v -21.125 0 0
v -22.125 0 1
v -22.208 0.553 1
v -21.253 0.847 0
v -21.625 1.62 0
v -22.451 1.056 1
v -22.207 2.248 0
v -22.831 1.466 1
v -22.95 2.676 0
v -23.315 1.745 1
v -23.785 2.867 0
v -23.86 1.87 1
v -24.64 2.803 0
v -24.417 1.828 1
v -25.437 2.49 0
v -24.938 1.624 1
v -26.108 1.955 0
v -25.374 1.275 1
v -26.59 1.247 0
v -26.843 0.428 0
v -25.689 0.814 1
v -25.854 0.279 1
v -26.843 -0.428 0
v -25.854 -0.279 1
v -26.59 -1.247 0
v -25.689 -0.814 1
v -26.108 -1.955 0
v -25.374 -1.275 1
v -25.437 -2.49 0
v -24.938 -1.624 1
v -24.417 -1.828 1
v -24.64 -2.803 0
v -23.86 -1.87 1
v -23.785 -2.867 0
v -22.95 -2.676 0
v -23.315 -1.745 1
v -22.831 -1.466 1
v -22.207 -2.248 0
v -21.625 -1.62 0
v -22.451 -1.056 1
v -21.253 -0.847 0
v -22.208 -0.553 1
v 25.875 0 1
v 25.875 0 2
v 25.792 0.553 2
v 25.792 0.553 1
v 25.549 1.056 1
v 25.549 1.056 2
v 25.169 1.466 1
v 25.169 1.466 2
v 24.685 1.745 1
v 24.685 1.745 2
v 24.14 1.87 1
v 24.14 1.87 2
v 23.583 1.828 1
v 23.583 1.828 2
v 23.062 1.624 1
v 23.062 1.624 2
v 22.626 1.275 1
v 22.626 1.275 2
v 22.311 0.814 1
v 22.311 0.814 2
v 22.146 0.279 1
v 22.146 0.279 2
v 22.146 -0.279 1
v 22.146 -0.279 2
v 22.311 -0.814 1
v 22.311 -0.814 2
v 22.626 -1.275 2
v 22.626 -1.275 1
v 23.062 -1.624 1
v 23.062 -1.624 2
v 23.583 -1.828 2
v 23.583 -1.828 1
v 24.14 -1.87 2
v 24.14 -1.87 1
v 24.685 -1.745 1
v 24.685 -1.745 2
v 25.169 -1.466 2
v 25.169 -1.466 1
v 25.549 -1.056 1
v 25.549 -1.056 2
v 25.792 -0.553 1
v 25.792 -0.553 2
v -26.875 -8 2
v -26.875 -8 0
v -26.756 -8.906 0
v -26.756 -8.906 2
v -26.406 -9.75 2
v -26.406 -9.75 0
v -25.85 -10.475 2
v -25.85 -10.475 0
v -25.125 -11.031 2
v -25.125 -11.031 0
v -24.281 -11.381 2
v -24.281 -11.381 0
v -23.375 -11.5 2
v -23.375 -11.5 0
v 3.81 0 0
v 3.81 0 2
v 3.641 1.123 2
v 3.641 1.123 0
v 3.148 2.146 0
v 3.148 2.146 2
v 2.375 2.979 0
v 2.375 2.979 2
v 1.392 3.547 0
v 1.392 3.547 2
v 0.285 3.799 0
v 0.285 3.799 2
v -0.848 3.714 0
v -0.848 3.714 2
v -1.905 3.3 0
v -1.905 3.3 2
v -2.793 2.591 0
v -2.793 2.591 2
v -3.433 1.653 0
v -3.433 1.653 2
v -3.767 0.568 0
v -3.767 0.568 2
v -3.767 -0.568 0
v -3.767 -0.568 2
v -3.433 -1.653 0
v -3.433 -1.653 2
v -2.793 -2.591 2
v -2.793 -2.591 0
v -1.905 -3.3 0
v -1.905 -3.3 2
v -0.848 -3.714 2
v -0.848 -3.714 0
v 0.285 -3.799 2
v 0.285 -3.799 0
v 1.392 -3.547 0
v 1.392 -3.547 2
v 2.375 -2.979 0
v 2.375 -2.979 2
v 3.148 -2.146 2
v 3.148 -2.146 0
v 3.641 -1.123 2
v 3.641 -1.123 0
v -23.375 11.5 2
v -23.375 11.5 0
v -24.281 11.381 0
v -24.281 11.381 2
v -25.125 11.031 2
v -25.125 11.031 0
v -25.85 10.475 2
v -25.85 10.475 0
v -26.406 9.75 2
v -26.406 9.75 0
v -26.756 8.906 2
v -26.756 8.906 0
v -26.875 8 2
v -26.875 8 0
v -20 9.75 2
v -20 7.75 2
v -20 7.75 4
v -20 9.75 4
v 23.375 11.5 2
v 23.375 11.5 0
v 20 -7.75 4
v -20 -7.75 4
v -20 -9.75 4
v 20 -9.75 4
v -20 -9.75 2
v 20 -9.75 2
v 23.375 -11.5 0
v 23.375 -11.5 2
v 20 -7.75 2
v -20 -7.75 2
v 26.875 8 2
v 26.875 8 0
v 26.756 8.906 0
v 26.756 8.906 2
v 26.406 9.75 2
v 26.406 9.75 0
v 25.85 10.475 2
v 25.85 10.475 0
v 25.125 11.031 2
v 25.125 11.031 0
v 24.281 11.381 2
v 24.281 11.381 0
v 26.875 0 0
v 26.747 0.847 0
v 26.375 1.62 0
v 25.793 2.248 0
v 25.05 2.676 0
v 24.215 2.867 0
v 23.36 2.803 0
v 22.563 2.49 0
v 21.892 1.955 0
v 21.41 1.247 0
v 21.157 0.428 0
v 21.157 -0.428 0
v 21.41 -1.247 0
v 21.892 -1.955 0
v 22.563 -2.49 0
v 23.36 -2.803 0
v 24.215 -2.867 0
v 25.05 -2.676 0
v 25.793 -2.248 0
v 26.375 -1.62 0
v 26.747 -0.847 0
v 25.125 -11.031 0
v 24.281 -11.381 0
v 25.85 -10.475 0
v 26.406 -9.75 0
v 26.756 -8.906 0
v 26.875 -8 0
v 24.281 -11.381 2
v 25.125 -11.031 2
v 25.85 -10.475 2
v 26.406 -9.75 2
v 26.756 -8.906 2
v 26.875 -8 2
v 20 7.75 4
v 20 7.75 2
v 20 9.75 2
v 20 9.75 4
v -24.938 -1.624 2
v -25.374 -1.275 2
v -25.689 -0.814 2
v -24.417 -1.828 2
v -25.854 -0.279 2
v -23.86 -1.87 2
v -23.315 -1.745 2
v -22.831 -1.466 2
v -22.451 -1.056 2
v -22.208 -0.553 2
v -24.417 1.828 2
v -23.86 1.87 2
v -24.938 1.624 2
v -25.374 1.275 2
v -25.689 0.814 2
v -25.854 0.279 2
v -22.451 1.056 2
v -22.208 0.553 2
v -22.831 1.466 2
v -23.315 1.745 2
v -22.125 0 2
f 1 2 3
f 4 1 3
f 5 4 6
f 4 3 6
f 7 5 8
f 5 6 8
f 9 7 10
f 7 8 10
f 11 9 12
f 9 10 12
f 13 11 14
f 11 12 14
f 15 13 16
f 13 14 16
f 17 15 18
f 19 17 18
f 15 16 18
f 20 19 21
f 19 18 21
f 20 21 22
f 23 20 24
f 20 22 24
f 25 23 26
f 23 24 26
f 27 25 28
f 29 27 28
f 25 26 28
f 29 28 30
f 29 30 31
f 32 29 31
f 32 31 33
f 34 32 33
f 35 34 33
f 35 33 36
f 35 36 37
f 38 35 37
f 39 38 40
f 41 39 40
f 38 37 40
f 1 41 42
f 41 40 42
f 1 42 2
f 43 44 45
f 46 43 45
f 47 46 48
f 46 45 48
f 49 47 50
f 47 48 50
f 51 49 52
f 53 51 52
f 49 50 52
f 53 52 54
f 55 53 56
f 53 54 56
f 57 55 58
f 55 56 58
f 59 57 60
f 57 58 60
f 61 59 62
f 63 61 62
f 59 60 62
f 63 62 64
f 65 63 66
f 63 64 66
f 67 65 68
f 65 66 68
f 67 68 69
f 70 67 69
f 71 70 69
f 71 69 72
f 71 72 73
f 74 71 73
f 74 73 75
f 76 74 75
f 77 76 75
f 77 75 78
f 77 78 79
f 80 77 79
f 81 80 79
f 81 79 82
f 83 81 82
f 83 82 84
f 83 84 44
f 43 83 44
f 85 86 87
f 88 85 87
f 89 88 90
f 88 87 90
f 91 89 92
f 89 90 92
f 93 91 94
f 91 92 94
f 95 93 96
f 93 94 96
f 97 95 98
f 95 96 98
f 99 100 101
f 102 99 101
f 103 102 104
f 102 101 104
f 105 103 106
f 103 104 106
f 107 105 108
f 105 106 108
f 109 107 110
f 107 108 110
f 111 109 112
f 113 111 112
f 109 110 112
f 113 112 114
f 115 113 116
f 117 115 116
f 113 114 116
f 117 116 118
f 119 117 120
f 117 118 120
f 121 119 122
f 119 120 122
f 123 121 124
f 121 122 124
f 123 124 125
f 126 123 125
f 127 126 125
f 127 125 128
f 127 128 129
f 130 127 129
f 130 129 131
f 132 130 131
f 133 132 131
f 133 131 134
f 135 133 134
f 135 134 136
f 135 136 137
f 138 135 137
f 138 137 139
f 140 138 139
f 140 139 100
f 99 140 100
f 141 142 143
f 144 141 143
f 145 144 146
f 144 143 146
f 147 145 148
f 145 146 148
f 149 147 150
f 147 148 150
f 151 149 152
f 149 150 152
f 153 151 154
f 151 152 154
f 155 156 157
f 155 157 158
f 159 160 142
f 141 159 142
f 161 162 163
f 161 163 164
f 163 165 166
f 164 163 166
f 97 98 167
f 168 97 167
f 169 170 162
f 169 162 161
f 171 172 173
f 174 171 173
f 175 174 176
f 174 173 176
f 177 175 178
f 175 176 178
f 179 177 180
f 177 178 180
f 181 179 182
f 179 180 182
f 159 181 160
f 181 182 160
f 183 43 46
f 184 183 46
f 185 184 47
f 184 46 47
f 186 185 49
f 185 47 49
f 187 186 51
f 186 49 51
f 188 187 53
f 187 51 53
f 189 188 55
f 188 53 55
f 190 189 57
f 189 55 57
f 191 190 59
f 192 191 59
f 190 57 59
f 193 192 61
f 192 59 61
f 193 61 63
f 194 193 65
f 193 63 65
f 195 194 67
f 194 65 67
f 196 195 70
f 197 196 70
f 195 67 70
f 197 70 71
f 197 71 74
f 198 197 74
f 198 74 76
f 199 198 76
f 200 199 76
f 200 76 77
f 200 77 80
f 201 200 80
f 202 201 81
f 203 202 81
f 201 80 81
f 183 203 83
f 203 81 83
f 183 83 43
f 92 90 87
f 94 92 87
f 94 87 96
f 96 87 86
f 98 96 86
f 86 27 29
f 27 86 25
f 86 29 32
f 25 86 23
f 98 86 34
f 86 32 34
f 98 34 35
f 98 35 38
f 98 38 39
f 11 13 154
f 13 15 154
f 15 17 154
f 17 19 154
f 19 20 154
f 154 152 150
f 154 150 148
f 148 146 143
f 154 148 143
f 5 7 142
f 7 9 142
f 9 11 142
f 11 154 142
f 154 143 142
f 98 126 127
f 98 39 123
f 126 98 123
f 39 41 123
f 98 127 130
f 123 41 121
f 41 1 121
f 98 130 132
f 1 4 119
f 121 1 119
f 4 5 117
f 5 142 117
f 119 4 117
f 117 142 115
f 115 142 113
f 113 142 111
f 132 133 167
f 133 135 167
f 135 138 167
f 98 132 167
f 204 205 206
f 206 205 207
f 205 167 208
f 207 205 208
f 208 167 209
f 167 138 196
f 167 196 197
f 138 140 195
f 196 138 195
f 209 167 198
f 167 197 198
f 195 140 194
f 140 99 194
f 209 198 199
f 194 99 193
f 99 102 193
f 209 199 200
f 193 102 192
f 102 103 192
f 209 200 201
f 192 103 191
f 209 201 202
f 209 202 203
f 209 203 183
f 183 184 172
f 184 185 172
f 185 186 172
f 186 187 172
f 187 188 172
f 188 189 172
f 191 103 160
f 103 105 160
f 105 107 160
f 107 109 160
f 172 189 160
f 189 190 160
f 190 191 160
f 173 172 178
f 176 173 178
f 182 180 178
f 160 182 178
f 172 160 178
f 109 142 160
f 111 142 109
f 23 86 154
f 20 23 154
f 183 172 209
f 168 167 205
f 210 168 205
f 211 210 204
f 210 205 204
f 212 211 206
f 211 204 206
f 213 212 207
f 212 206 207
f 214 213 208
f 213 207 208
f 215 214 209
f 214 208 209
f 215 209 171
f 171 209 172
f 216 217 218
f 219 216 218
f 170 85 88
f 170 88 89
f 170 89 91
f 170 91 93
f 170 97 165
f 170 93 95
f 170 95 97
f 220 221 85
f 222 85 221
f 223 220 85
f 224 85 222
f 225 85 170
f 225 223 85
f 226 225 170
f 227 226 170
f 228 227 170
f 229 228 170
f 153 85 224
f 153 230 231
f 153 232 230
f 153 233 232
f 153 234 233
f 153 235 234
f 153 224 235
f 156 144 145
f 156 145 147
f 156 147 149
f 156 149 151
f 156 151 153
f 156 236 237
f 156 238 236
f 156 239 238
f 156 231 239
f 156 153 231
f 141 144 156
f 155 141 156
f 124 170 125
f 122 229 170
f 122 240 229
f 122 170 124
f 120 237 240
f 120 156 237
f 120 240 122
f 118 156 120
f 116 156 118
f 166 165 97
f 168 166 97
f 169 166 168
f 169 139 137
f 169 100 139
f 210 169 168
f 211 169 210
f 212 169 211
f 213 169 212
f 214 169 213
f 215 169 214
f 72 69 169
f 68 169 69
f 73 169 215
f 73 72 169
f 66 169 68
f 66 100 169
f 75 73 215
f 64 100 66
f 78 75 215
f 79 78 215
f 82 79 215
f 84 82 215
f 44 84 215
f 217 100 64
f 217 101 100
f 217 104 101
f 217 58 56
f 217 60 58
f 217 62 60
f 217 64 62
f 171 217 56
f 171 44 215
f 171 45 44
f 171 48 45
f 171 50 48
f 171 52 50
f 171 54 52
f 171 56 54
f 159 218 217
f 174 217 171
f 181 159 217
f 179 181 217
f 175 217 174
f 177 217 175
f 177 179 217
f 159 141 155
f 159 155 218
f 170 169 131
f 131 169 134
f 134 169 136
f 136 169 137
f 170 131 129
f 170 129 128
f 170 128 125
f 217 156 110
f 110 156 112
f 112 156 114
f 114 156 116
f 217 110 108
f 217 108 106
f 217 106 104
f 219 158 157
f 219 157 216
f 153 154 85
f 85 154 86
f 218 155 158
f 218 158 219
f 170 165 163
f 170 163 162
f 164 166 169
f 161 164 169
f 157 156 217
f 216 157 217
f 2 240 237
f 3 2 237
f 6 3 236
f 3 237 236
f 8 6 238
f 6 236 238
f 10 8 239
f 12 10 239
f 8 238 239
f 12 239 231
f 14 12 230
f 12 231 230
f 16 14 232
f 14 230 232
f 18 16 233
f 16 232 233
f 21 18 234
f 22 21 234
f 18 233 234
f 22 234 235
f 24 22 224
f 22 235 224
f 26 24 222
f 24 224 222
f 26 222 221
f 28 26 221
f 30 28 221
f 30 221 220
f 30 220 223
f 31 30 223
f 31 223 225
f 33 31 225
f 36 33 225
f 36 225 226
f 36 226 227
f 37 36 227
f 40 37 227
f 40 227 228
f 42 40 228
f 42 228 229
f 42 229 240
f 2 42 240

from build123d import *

# Parameters (mm, degrees)
F1_DEPTH = 2
F2_R     = 1.875
F3_DEPTH = 2.001
F4_SIZE  = 0.99999
F5_W     = 40
F5_H     = 2
F6_DEPTH = 2
F7_R     = 3.81
F8_DEPTH = 2.001


# Not quite as in the source:
# - a fillet or chamfer is up to 0.001 mm smaller than in the source, because OpenCascade refuses the exact size


with BuildPart() as f1:
    # F0 (on Top) → F1 (new body)
    with BuildSketch(Plane.XY):
        with BuildLine():
            ThreePointArc((26.875, 8), (25.8498737342, 10.4748737342), (23.375, 11.5))
            Line((23.375, 11.5), (-23.375, 11.5))
            ThreePointArc((-23.375, 11.5), (-25.8498737342, 10.4748737342), (-26.875, 8))
            Line((-26.875, 8), (-26.875, -8))
            ThreePointArc((-26.875, -8), (-25.8498737342, -10.4748737342), (-23.375, -11.5))
            Line((-23.375, -11.5), (23.375, -11.5))
            ThreePointArc((23.375, -11.5), (25.8498737342, -10.4748737342), (26.875, -8))
            Line((26.875, -8), (26.875, 8))
        make_face()
    extrude(amount=F1_DEPTH)

    # F2 (on face) → F3 (cut, through all)
    with BuildSketch(Plane.XY.offset(2)):
        with Locations((-24, 0)):
            Circle(F2_R)
        with Locations((24, 0)):
            Circle(F2_R)
    extrude(amount=-F3_DEPTH, mode=Mode.SUBTRACT)

    # F4 (size 1 in the source; OpenCascade refuses exactly that, so slightly less here)
    f4_edges = [f1.edges().sort_by_distance(p)[0] for p in [
        (-25.875, 0, 0),
        (22.125, 0, 0),
    ]]
    chamfer(f4_edges, length=F4_SIZE)

    # F5 (on face) → F6 (join)
    with BuildSketch(Plane.XY.offset(2)):
        with Locations((0, 8.75)):
            Rectangle(F5_W, F5_H)
        with Locations((0, -8.75)):
            Rectangle(F5_W, F5_H)
    extrude(amount=F6_DEPTH)

    # F7 (on face) → F8 (cut, through all)
    with BuildSketch(Plane.XY.offset(2)):
        Circle(F7_R)
    extrude(amount=-F8_DEPTH, mode=Mode.SUBTRACT)


solid = f1.part
